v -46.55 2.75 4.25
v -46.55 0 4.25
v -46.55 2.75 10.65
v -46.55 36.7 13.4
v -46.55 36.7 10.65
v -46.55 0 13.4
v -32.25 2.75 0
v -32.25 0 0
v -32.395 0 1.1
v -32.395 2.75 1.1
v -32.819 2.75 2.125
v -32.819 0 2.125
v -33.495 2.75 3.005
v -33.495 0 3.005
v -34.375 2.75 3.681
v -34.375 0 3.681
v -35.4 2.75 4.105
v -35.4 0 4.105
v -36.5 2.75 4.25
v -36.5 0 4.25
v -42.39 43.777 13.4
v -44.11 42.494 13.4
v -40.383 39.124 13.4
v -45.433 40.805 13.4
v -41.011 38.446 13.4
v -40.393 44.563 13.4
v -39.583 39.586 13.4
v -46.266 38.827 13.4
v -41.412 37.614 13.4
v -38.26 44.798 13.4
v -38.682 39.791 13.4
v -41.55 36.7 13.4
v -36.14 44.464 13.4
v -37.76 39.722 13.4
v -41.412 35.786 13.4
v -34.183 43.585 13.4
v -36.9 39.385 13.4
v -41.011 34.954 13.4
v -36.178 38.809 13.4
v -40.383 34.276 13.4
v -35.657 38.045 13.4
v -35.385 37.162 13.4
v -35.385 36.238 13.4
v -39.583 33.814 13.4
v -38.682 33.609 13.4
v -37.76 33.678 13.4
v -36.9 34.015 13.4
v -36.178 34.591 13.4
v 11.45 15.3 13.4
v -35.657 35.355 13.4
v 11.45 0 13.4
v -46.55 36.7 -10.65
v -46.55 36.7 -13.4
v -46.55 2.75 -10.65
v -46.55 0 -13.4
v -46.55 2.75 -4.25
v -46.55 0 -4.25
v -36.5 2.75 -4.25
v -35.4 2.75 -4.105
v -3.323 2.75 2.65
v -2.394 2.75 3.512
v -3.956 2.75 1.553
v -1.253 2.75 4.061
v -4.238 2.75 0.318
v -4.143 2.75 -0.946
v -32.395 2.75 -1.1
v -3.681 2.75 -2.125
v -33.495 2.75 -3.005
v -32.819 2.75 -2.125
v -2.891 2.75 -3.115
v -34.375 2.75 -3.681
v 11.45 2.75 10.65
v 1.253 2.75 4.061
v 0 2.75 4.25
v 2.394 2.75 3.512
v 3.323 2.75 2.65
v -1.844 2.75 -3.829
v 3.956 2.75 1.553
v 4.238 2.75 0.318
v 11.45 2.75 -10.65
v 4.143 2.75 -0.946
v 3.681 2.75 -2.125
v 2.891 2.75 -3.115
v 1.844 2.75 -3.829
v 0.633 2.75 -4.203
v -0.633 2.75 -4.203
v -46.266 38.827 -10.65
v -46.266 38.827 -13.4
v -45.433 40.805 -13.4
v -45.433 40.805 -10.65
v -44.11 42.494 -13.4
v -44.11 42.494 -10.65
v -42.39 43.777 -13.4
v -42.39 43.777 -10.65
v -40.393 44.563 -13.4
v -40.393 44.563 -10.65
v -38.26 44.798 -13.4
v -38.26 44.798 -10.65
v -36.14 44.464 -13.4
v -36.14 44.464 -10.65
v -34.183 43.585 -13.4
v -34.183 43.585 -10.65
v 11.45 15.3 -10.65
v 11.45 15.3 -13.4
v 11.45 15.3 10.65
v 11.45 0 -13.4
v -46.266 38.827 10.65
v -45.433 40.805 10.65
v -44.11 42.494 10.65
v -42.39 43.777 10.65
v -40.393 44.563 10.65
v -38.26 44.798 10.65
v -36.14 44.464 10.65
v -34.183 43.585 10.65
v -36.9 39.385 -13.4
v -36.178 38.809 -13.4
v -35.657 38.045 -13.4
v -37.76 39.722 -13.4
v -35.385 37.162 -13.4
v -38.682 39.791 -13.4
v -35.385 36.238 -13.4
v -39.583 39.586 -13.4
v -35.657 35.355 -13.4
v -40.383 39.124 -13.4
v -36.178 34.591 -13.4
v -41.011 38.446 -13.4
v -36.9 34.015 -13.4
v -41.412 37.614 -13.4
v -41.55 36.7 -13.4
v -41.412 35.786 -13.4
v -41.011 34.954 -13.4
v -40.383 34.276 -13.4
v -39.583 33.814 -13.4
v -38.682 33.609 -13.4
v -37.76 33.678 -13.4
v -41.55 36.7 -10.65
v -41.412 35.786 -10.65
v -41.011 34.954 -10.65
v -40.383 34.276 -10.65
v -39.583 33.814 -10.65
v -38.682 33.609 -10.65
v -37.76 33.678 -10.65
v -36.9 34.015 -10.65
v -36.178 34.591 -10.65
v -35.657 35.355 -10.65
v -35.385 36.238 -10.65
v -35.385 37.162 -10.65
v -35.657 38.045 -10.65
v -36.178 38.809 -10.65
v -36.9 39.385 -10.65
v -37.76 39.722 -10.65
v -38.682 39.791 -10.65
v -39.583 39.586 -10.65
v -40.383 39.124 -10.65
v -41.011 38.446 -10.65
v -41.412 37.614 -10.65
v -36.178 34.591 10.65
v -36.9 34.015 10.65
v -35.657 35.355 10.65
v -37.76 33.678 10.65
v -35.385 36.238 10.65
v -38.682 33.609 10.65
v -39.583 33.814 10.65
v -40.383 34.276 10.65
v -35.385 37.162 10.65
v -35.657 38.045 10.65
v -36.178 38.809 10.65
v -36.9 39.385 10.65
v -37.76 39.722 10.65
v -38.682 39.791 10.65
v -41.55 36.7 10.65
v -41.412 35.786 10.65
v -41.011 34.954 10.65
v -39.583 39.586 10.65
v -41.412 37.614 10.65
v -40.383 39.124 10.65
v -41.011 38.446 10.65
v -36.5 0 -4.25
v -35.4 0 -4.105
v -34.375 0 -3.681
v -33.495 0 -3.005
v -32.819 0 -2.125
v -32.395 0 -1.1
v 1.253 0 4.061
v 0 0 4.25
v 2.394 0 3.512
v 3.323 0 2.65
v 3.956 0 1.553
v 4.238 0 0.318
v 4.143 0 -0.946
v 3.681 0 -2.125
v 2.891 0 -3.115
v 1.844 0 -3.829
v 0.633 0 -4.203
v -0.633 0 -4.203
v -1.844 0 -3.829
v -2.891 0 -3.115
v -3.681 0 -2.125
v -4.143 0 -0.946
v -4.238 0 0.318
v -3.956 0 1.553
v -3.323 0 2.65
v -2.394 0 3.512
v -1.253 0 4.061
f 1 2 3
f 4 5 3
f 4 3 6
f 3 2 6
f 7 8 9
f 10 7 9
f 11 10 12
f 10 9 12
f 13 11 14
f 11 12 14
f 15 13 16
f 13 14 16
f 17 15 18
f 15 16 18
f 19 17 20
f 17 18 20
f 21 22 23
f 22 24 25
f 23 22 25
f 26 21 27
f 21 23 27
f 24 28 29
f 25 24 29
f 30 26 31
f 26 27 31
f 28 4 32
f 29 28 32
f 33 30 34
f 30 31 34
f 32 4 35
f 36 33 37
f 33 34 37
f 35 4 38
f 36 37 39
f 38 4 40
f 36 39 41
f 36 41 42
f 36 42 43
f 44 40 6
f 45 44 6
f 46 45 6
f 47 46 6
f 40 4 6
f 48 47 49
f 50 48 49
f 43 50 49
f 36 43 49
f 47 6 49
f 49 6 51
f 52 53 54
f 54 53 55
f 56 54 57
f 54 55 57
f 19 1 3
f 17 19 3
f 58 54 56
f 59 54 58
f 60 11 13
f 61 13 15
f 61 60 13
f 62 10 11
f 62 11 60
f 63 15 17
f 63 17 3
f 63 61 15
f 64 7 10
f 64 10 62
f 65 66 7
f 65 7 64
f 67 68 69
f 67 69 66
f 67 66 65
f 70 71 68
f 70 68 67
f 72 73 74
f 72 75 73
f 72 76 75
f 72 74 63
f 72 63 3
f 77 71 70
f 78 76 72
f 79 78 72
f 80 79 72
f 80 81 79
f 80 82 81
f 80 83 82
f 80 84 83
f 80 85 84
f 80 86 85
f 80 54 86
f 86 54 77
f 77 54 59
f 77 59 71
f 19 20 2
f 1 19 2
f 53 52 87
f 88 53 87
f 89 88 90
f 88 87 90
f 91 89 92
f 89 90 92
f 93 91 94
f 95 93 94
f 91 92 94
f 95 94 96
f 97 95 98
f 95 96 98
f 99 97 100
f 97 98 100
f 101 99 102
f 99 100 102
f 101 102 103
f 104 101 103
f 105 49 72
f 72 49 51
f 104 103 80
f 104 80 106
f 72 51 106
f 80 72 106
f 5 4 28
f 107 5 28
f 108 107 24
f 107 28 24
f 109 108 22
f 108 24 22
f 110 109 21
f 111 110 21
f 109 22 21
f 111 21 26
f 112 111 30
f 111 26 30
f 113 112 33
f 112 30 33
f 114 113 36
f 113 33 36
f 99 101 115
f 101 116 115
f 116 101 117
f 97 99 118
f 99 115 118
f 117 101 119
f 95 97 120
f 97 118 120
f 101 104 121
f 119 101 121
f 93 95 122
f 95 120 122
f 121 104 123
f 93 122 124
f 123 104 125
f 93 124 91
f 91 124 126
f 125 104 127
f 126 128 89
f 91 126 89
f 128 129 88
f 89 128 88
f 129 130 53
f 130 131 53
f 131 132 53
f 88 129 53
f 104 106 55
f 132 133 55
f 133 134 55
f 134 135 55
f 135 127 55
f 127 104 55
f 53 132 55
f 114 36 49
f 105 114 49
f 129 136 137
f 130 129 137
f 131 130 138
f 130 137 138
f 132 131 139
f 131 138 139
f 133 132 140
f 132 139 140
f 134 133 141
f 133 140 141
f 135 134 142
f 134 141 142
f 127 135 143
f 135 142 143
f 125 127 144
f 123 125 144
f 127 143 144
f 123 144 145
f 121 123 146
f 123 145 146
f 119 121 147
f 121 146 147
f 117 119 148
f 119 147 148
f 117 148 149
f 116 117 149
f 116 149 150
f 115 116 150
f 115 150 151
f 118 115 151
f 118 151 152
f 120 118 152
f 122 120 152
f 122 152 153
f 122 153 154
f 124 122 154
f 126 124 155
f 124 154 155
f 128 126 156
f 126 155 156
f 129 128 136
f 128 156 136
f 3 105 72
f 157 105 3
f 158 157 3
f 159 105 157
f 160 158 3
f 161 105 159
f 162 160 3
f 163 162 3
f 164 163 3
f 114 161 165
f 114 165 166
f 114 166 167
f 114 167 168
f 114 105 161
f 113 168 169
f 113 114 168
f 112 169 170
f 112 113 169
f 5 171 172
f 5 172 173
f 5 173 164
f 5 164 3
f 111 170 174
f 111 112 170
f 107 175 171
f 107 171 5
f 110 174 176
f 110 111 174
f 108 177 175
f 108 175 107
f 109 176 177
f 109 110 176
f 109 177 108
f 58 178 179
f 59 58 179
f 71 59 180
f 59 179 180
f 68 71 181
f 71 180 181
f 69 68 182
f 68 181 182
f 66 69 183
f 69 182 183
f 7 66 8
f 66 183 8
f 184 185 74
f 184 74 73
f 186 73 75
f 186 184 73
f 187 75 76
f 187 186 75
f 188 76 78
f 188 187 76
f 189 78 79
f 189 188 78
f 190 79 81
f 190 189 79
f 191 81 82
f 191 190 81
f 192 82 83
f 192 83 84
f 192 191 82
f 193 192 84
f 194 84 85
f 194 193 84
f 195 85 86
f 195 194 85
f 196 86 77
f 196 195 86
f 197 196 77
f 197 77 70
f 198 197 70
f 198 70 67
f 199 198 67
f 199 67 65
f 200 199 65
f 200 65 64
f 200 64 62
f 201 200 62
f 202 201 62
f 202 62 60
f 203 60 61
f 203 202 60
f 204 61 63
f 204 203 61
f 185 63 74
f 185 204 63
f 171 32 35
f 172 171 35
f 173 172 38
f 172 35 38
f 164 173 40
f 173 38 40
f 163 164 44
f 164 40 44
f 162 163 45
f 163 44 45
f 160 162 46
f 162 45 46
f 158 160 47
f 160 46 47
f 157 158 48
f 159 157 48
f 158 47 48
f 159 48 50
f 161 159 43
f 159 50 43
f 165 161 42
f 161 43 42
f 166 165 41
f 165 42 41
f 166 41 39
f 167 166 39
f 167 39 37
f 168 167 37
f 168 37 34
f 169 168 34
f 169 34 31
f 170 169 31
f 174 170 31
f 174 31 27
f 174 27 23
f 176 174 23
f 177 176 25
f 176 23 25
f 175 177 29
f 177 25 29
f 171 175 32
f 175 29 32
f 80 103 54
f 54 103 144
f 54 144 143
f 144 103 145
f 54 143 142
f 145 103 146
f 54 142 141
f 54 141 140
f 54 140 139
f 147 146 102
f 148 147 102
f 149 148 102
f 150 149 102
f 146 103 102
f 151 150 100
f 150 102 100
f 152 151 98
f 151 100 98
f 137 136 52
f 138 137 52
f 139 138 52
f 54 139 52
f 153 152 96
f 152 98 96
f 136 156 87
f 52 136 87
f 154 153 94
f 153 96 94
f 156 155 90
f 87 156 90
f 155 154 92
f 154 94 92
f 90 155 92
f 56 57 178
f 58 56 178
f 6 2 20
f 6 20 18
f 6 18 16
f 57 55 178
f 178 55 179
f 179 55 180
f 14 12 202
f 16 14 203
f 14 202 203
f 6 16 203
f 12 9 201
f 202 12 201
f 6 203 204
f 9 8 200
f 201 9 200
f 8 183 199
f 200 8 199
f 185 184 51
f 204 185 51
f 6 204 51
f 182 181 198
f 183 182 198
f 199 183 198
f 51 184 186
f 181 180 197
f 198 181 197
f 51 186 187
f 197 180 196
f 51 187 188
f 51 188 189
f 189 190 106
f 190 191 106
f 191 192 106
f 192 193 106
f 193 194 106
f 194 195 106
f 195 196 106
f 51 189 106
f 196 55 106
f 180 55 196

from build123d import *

# Parameters (mm, degrees)
SKETCH1_R           = 4.25
BOSS_EXTRUDE1_DEPTH = 2.75
BOSS_EXTRUDE2_START = 13.4
SKETCH2_R           = 3.1
BOSS_EXTRUDE2_DEPTH = 2.75
BOSS_EXTRUDE3_START = -10.65
SKETCH2_2_R         = 3.1
BOSS_EXTRUDE3_DEPTH = 2.75


with BuildPart() as part:
    # Sketch1 → Boss-Extrude1 (new body)
    with BuildSketch(Plane(origin=(0, 0, 0), x_dir=(1, 0, 0), z_dir=(0, 1, 0))):
        with BuildLine():
            Line((-46.55, 4.25), (-36.5, 4.25))
            ThreePointArc((-36.5, 4.25), (-33.49479618, 3.00520382), (-32.25, 0))
            ThreePointArc((-32.25, 0), (-33.49479618, -3.00520382), (-36.5, -4.25))
            Line((-36.5, -4.25), (-46.55, -4.25))
            Line((-46.55, -4.25), (-46.55, -13.4))
            Line((-46.55, -13.4), (11.45, -13.4))
            Line((11.45, -13.4), (11.45, 13.4))
            Line((11.45, 13.4), (-46.55, 13.4))
            Line((-46.55, 13.4), (-46.55, 4.25))
        make_face()
        with Locations(Location((0, 0, 0), (0, 0, 270))):
            Circle(SKETCH1_R, mode=Mode.SUBTRACT)
    extrude(amount=BOSS_EXTRUDE1_DEPTH)

    # Sketch2 → Boss-Extrude2 (add)
    with BuildSketch(Plane.XY.offset(BOSS_EXTRUDE2_START)):
        with BuildLine():
            Line((-46.55, 0), (-46.55, 36.7))
            ThreePointArc((-46.55, 36.7), (-42.389803721, 43.777283846), (-34.182605767, 43.584718328))
            Line((-34.182605767, 43.584718328), (11.45, 15.3))
            Line((11.45, 15.3), (11.45, 0))
            Line((11.45, 0), (-46.55, 0))
        make_face()
        with Locations(Location((-38.45, 36.7, 0), (0, 0, 180))):
            Circle(SKETCH2_R, mode=Mode.SUBTRACT)
    extrude(amount=-BOSS_EXTRUDE2_DEPTH)

    # Sketch2<2> → Boss-Extrude3 (add)
    with BuildSketch(Plane.XY.offset(BOSS_EXTRUDE3_START)):
        with BuildLine():
            Line((-46.55, 0), (-46.55, 36.7))
            ThreePointArc((-46.55, 36.7), (-42.389803721, 43.777283846), (-34.182605767, 43.584718328))
            Line((-34.182605767, 43.584718328), (11.45, 15.3))
            Line((11.45, 15.3), (11.45, 0))
            Line((11.45, 0), (-46.55, 0))
        make_face()
        with Locations(Location((-38.45, 36.7, 0), (0, 0, 180))):
            Circle(SKETCH2_2_R, mode=Mode.SUBTRACT)
    extrude(amount=-BOSS_EXTRUDE3_DEPTH)


solid = part.part
